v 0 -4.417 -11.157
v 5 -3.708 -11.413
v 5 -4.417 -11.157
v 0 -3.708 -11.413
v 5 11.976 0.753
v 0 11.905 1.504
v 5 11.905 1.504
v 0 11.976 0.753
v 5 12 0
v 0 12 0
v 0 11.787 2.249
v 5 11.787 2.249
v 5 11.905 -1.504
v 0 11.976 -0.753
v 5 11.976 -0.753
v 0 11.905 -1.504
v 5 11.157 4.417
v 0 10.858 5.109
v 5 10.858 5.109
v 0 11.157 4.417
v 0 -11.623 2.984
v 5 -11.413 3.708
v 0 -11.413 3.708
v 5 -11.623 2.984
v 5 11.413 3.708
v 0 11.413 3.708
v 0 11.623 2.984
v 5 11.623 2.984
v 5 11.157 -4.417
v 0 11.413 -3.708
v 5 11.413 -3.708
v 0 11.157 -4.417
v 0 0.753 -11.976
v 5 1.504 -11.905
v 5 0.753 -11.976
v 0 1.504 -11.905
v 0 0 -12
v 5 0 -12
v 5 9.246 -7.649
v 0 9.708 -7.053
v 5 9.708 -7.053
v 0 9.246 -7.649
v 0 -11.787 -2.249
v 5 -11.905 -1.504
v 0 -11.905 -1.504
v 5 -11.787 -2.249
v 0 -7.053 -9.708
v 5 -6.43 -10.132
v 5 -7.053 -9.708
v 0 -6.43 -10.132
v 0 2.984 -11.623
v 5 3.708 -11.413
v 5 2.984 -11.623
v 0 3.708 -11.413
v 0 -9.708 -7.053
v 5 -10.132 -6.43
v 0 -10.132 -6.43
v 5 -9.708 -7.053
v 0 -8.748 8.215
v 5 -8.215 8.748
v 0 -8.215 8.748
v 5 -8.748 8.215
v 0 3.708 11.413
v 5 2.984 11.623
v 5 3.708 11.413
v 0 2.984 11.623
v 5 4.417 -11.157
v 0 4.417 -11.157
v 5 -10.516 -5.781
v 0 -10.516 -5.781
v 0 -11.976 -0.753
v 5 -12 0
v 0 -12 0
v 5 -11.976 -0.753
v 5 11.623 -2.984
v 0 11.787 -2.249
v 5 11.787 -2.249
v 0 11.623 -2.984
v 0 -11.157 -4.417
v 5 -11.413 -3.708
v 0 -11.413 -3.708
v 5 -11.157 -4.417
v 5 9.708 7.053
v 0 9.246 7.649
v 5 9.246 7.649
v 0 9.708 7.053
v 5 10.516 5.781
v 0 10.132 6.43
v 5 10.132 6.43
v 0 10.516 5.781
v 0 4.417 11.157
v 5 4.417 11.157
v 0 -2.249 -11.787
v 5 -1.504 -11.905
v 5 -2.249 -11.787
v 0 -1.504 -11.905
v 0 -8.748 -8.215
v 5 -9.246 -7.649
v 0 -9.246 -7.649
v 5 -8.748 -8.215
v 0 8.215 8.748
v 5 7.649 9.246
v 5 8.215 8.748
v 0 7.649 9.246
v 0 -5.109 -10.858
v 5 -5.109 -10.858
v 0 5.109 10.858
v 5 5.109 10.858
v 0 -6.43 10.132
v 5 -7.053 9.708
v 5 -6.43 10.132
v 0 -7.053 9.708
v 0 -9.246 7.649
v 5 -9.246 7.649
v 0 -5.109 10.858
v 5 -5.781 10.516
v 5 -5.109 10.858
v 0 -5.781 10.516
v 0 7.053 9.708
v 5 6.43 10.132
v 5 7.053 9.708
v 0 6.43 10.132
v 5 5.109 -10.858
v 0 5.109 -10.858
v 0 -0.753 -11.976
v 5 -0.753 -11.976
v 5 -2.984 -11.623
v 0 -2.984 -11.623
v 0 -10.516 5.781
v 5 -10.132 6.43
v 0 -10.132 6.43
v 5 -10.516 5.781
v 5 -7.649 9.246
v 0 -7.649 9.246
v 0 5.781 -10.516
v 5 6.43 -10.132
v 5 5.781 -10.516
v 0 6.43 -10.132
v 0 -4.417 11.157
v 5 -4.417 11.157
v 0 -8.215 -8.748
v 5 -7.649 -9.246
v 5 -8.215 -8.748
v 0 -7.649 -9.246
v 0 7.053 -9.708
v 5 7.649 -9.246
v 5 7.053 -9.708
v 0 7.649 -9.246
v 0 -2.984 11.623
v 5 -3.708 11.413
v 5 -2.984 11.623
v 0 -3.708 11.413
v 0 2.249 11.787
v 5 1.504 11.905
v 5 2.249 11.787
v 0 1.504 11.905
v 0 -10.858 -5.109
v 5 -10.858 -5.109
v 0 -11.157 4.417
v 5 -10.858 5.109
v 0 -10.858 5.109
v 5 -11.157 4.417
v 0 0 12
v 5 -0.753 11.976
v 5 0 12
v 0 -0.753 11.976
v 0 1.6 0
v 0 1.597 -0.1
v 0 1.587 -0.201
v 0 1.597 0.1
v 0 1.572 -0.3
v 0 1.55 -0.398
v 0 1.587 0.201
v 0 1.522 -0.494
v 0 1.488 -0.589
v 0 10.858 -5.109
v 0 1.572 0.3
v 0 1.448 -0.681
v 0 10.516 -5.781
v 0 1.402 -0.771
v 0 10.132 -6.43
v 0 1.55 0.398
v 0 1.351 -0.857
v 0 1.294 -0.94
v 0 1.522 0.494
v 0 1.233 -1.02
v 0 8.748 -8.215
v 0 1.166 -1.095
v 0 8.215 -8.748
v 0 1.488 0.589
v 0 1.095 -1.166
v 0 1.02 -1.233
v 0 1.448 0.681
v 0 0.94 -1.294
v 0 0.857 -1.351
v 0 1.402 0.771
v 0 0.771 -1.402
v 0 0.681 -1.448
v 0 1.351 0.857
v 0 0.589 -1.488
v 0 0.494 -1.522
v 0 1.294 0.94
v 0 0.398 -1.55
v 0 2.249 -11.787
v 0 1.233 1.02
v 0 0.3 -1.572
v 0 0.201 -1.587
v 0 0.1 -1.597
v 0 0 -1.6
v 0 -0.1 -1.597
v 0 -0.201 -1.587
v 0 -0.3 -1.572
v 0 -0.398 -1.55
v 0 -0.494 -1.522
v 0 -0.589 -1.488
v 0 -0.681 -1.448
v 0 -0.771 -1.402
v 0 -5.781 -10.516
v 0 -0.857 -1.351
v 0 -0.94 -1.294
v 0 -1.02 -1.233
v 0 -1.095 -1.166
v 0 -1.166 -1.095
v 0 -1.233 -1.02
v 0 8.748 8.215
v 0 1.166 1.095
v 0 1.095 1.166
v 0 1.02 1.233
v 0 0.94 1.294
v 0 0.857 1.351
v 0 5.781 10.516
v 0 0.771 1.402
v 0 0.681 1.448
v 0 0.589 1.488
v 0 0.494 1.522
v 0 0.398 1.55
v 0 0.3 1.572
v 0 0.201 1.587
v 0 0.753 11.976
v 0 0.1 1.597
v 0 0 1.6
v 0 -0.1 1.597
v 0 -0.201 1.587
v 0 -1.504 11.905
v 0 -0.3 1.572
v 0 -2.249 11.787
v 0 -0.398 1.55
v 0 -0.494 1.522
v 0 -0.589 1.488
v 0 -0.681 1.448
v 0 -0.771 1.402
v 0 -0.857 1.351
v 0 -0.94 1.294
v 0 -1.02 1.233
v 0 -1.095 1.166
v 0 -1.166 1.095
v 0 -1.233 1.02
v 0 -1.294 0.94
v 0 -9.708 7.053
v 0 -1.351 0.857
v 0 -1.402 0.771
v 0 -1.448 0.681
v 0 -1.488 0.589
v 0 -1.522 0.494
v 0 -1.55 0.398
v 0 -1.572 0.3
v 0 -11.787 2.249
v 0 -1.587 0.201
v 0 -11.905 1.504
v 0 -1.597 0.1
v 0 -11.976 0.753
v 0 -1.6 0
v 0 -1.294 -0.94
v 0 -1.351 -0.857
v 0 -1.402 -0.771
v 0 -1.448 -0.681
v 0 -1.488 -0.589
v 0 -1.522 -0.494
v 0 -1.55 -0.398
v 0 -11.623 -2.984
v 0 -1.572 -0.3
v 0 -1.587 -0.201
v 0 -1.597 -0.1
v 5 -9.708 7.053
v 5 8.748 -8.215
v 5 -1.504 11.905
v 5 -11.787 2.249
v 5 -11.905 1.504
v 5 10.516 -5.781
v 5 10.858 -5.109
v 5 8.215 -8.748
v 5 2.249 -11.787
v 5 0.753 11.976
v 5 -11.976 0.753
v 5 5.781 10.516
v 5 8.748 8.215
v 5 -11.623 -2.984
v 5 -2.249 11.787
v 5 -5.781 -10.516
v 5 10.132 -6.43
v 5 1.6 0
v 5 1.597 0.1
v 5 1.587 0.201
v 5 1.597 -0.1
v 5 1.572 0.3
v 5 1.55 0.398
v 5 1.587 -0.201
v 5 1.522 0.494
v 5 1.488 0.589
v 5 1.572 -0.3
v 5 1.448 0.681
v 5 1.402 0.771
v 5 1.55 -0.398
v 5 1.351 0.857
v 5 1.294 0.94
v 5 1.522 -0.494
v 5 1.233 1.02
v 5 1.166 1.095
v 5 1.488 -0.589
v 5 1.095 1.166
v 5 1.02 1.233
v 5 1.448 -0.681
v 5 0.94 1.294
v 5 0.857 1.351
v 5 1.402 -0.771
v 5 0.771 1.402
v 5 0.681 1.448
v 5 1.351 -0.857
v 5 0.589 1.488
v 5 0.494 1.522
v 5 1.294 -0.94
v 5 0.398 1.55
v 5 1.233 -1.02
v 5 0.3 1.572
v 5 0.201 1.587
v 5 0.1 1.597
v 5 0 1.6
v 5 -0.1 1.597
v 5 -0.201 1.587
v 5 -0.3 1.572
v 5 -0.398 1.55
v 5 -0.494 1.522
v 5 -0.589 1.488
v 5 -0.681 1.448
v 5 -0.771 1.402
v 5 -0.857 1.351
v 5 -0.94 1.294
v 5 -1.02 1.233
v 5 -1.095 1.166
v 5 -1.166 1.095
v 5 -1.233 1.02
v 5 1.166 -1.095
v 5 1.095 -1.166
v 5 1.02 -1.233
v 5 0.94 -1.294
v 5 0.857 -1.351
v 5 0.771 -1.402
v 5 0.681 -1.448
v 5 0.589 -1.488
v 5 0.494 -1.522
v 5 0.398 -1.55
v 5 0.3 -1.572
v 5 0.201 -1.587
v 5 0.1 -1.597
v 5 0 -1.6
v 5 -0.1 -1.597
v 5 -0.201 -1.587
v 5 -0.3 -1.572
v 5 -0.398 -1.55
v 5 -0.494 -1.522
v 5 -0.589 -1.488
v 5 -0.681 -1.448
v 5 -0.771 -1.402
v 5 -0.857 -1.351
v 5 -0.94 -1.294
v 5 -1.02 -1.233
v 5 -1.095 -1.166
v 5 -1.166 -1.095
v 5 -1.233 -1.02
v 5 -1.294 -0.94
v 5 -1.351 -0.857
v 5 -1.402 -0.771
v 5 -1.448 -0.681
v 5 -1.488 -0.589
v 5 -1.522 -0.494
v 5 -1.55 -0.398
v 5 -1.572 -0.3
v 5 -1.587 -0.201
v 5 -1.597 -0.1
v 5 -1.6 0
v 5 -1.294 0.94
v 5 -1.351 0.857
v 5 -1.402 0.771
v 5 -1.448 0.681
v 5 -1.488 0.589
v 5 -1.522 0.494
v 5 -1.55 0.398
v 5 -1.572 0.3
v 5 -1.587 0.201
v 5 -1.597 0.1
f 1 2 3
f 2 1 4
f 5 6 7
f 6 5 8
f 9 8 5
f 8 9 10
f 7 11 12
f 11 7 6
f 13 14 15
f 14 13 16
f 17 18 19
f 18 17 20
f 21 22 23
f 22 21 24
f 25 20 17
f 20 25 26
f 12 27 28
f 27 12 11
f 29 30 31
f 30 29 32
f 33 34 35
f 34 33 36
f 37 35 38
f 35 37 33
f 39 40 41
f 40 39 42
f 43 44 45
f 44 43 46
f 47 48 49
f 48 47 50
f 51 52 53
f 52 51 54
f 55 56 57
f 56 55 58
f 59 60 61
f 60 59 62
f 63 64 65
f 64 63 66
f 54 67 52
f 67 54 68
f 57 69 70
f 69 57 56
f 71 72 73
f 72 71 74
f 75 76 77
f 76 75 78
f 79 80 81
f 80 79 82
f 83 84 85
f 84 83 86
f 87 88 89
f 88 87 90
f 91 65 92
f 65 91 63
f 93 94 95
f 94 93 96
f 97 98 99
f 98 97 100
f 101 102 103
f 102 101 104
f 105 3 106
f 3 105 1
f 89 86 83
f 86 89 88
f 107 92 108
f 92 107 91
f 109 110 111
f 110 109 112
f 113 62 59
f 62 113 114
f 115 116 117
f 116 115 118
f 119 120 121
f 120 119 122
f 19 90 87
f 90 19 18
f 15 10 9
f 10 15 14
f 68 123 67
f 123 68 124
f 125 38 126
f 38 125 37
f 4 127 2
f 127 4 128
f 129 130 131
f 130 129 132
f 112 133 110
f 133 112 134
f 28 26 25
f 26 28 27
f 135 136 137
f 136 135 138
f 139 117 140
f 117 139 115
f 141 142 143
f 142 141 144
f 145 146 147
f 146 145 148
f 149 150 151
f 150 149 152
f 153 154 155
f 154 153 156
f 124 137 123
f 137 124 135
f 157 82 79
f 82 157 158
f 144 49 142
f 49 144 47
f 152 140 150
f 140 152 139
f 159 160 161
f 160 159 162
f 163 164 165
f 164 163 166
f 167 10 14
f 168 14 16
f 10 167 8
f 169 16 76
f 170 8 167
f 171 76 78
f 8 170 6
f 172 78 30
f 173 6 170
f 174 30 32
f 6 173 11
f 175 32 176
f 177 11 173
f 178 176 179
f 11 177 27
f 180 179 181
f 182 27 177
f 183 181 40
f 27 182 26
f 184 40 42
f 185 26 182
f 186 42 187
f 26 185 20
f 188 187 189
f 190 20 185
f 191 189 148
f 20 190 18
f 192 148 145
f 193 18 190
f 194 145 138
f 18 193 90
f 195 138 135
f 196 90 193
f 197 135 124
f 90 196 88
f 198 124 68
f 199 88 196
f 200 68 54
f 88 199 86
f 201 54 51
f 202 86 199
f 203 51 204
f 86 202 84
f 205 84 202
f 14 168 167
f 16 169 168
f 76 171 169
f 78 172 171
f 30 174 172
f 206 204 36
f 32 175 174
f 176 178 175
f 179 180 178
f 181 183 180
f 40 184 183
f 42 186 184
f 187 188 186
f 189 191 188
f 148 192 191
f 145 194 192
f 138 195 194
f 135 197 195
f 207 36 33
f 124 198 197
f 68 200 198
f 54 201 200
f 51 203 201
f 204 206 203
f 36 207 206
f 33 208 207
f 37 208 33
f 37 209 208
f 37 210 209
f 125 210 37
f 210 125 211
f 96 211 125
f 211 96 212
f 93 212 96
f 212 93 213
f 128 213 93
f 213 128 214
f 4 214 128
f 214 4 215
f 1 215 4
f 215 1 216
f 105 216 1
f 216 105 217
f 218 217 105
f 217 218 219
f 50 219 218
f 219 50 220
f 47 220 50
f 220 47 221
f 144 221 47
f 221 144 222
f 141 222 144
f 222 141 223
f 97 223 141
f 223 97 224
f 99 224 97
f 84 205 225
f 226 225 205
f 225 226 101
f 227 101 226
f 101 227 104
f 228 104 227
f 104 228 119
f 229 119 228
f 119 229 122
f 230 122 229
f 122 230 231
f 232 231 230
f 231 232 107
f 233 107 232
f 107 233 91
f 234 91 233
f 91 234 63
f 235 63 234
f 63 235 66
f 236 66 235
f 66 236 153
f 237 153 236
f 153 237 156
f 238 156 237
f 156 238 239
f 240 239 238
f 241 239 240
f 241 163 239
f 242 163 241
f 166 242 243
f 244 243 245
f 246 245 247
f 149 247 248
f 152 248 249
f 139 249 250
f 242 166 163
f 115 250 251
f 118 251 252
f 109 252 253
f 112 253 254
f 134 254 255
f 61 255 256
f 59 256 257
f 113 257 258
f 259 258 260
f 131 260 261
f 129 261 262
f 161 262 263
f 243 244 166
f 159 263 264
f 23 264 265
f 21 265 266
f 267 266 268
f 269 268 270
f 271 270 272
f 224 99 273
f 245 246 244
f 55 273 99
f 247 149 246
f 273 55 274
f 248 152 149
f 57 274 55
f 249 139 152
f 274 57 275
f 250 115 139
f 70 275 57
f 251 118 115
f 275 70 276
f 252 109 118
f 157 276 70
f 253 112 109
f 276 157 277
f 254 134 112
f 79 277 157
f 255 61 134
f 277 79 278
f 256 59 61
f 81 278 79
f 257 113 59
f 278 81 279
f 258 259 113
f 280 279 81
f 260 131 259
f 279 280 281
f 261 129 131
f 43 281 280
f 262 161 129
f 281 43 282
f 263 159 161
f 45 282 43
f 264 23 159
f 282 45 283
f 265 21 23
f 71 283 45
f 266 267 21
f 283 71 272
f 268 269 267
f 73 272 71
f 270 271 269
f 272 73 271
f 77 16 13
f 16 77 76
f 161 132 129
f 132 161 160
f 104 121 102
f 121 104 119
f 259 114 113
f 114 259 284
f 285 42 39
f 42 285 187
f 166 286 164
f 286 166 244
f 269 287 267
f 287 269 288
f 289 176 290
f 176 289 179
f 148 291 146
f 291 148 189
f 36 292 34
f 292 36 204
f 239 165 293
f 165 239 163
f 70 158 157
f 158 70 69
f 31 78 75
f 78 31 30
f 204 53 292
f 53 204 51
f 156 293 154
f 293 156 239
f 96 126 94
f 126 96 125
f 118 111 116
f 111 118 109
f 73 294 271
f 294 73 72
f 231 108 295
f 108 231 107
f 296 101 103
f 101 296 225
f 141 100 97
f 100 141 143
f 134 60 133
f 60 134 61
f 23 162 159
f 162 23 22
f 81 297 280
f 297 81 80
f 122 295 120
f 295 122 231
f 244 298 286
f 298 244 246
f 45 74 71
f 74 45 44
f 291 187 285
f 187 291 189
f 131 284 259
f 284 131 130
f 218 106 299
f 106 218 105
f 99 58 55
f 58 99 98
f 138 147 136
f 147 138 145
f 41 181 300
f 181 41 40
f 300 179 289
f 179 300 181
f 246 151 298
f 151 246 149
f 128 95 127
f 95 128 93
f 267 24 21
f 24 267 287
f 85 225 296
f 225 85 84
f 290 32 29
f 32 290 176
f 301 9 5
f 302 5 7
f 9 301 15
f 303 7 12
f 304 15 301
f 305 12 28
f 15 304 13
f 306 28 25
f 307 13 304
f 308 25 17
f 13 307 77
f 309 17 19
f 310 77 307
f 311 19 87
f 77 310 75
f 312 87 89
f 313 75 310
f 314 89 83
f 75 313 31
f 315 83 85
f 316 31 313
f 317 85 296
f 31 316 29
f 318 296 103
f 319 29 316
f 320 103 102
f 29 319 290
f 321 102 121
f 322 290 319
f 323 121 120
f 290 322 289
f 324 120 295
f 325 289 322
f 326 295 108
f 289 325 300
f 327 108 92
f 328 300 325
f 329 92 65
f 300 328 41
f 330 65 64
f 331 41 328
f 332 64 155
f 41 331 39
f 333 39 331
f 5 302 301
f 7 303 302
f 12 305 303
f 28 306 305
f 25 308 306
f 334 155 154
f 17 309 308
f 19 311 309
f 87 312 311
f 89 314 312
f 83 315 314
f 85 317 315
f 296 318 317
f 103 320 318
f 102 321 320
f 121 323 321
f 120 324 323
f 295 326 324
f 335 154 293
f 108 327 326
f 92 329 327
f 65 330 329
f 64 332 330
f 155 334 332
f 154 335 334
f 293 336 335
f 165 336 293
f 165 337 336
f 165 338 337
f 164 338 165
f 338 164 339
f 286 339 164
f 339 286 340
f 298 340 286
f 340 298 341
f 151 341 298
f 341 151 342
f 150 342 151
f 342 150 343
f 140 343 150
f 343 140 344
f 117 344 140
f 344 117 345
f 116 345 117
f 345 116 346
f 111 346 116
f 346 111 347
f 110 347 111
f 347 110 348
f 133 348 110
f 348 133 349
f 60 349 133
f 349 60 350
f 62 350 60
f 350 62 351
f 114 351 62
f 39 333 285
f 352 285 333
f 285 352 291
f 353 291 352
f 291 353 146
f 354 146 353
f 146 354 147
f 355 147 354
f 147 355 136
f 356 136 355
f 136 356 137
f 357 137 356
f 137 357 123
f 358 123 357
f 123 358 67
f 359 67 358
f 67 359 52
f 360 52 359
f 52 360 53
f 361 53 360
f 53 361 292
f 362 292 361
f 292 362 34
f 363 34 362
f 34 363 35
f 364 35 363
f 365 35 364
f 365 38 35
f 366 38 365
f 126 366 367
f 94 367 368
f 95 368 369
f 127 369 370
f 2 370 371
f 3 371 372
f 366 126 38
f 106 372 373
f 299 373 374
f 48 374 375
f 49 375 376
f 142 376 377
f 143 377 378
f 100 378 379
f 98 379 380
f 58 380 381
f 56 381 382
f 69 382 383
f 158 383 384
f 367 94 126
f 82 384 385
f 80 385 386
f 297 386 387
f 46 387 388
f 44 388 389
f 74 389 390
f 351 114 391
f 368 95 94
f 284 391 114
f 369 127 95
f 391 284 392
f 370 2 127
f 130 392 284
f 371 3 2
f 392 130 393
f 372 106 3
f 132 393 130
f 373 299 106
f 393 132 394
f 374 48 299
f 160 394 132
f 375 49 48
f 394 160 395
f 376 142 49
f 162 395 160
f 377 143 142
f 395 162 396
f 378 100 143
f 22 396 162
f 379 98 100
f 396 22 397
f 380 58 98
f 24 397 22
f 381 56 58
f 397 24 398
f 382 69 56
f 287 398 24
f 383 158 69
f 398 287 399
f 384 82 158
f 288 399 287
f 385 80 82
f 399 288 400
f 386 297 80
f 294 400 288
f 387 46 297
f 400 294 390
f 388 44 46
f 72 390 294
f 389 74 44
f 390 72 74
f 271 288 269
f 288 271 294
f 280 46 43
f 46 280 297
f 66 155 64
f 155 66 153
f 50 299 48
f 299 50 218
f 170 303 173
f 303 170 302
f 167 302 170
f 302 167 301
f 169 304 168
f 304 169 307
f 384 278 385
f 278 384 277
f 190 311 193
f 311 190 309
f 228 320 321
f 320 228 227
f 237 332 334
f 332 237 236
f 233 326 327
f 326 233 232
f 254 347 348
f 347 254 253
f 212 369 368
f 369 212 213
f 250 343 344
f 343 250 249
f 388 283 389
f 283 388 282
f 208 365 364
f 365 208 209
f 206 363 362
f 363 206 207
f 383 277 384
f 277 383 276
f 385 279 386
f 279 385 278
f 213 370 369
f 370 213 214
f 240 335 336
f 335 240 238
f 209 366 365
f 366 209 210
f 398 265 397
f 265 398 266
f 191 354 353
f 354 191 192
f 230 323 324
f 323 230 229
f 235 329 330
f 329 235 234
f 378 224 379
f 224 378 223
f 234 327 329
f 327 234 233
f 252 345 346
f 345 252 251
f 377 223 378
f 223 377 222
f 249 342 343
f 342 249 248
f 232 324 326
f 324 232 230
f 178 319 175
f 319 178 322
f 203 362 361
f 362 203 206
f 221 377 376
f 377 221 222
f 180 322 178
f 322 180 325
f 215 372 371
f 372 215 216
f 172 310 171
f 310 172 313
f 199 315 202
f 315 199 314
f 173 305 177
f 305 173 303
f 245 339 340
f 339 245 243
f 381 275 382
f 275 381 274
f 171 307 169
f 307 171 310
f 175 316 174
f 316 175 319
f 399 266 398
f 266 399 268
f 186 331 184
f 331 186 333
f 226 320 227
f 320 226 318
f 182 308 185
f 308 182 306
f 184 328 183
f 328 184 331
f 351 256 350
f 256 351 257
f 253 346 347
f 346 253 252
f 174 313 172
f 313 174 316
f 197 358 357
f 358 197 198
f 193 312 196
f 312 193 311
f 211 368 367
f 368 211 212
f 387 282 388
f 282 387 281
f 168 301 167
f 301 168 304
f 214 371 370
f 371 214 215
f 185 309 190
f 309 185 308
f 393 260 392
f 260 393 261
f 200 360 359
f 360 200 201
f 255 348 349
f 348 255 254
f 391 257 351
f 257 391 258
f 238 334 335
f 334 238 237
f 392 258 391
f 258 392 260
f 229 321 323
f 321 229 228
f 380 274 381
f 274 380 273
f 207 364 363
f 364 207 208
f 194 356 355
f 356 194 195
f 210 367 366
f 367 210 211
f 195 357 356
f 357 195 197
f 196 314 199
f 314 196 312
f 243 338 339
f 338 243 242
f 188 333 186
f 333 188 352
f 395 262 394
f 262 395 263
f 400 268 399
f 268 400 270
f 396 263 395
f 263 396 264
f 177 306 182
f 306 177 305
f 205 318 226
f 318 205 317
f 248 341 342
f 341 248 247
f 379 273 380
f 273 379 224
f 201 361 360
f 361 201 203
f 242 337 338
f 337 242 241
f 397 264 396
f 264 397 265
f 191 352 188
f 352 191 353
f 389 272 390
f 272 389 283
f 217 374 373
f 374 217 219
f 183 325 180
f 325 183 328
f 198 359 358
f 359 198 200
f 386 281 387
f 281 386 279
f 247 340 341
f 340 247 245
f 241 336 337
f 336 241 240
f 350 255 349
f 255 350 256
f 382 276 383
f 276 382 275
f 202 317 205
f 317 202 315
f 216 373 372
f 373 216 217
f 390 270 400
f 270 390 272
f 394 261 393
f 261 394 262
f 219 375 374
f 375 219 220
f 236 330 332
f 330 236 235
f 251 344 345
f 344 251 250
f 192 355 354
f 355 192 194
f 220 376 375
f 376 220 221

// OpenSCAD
module wheel(){
    r_wheel = 12;
    $fn=100;
    color("Gray"){
        rotate([90,0,90]){
            difference(){
                cylinder(5,r_wheel,r_wheel);
                translate([0,0,-1]){
                    cylinder(7,1.6,1.6);
                }
            }
        }
    }
}

wheel();
